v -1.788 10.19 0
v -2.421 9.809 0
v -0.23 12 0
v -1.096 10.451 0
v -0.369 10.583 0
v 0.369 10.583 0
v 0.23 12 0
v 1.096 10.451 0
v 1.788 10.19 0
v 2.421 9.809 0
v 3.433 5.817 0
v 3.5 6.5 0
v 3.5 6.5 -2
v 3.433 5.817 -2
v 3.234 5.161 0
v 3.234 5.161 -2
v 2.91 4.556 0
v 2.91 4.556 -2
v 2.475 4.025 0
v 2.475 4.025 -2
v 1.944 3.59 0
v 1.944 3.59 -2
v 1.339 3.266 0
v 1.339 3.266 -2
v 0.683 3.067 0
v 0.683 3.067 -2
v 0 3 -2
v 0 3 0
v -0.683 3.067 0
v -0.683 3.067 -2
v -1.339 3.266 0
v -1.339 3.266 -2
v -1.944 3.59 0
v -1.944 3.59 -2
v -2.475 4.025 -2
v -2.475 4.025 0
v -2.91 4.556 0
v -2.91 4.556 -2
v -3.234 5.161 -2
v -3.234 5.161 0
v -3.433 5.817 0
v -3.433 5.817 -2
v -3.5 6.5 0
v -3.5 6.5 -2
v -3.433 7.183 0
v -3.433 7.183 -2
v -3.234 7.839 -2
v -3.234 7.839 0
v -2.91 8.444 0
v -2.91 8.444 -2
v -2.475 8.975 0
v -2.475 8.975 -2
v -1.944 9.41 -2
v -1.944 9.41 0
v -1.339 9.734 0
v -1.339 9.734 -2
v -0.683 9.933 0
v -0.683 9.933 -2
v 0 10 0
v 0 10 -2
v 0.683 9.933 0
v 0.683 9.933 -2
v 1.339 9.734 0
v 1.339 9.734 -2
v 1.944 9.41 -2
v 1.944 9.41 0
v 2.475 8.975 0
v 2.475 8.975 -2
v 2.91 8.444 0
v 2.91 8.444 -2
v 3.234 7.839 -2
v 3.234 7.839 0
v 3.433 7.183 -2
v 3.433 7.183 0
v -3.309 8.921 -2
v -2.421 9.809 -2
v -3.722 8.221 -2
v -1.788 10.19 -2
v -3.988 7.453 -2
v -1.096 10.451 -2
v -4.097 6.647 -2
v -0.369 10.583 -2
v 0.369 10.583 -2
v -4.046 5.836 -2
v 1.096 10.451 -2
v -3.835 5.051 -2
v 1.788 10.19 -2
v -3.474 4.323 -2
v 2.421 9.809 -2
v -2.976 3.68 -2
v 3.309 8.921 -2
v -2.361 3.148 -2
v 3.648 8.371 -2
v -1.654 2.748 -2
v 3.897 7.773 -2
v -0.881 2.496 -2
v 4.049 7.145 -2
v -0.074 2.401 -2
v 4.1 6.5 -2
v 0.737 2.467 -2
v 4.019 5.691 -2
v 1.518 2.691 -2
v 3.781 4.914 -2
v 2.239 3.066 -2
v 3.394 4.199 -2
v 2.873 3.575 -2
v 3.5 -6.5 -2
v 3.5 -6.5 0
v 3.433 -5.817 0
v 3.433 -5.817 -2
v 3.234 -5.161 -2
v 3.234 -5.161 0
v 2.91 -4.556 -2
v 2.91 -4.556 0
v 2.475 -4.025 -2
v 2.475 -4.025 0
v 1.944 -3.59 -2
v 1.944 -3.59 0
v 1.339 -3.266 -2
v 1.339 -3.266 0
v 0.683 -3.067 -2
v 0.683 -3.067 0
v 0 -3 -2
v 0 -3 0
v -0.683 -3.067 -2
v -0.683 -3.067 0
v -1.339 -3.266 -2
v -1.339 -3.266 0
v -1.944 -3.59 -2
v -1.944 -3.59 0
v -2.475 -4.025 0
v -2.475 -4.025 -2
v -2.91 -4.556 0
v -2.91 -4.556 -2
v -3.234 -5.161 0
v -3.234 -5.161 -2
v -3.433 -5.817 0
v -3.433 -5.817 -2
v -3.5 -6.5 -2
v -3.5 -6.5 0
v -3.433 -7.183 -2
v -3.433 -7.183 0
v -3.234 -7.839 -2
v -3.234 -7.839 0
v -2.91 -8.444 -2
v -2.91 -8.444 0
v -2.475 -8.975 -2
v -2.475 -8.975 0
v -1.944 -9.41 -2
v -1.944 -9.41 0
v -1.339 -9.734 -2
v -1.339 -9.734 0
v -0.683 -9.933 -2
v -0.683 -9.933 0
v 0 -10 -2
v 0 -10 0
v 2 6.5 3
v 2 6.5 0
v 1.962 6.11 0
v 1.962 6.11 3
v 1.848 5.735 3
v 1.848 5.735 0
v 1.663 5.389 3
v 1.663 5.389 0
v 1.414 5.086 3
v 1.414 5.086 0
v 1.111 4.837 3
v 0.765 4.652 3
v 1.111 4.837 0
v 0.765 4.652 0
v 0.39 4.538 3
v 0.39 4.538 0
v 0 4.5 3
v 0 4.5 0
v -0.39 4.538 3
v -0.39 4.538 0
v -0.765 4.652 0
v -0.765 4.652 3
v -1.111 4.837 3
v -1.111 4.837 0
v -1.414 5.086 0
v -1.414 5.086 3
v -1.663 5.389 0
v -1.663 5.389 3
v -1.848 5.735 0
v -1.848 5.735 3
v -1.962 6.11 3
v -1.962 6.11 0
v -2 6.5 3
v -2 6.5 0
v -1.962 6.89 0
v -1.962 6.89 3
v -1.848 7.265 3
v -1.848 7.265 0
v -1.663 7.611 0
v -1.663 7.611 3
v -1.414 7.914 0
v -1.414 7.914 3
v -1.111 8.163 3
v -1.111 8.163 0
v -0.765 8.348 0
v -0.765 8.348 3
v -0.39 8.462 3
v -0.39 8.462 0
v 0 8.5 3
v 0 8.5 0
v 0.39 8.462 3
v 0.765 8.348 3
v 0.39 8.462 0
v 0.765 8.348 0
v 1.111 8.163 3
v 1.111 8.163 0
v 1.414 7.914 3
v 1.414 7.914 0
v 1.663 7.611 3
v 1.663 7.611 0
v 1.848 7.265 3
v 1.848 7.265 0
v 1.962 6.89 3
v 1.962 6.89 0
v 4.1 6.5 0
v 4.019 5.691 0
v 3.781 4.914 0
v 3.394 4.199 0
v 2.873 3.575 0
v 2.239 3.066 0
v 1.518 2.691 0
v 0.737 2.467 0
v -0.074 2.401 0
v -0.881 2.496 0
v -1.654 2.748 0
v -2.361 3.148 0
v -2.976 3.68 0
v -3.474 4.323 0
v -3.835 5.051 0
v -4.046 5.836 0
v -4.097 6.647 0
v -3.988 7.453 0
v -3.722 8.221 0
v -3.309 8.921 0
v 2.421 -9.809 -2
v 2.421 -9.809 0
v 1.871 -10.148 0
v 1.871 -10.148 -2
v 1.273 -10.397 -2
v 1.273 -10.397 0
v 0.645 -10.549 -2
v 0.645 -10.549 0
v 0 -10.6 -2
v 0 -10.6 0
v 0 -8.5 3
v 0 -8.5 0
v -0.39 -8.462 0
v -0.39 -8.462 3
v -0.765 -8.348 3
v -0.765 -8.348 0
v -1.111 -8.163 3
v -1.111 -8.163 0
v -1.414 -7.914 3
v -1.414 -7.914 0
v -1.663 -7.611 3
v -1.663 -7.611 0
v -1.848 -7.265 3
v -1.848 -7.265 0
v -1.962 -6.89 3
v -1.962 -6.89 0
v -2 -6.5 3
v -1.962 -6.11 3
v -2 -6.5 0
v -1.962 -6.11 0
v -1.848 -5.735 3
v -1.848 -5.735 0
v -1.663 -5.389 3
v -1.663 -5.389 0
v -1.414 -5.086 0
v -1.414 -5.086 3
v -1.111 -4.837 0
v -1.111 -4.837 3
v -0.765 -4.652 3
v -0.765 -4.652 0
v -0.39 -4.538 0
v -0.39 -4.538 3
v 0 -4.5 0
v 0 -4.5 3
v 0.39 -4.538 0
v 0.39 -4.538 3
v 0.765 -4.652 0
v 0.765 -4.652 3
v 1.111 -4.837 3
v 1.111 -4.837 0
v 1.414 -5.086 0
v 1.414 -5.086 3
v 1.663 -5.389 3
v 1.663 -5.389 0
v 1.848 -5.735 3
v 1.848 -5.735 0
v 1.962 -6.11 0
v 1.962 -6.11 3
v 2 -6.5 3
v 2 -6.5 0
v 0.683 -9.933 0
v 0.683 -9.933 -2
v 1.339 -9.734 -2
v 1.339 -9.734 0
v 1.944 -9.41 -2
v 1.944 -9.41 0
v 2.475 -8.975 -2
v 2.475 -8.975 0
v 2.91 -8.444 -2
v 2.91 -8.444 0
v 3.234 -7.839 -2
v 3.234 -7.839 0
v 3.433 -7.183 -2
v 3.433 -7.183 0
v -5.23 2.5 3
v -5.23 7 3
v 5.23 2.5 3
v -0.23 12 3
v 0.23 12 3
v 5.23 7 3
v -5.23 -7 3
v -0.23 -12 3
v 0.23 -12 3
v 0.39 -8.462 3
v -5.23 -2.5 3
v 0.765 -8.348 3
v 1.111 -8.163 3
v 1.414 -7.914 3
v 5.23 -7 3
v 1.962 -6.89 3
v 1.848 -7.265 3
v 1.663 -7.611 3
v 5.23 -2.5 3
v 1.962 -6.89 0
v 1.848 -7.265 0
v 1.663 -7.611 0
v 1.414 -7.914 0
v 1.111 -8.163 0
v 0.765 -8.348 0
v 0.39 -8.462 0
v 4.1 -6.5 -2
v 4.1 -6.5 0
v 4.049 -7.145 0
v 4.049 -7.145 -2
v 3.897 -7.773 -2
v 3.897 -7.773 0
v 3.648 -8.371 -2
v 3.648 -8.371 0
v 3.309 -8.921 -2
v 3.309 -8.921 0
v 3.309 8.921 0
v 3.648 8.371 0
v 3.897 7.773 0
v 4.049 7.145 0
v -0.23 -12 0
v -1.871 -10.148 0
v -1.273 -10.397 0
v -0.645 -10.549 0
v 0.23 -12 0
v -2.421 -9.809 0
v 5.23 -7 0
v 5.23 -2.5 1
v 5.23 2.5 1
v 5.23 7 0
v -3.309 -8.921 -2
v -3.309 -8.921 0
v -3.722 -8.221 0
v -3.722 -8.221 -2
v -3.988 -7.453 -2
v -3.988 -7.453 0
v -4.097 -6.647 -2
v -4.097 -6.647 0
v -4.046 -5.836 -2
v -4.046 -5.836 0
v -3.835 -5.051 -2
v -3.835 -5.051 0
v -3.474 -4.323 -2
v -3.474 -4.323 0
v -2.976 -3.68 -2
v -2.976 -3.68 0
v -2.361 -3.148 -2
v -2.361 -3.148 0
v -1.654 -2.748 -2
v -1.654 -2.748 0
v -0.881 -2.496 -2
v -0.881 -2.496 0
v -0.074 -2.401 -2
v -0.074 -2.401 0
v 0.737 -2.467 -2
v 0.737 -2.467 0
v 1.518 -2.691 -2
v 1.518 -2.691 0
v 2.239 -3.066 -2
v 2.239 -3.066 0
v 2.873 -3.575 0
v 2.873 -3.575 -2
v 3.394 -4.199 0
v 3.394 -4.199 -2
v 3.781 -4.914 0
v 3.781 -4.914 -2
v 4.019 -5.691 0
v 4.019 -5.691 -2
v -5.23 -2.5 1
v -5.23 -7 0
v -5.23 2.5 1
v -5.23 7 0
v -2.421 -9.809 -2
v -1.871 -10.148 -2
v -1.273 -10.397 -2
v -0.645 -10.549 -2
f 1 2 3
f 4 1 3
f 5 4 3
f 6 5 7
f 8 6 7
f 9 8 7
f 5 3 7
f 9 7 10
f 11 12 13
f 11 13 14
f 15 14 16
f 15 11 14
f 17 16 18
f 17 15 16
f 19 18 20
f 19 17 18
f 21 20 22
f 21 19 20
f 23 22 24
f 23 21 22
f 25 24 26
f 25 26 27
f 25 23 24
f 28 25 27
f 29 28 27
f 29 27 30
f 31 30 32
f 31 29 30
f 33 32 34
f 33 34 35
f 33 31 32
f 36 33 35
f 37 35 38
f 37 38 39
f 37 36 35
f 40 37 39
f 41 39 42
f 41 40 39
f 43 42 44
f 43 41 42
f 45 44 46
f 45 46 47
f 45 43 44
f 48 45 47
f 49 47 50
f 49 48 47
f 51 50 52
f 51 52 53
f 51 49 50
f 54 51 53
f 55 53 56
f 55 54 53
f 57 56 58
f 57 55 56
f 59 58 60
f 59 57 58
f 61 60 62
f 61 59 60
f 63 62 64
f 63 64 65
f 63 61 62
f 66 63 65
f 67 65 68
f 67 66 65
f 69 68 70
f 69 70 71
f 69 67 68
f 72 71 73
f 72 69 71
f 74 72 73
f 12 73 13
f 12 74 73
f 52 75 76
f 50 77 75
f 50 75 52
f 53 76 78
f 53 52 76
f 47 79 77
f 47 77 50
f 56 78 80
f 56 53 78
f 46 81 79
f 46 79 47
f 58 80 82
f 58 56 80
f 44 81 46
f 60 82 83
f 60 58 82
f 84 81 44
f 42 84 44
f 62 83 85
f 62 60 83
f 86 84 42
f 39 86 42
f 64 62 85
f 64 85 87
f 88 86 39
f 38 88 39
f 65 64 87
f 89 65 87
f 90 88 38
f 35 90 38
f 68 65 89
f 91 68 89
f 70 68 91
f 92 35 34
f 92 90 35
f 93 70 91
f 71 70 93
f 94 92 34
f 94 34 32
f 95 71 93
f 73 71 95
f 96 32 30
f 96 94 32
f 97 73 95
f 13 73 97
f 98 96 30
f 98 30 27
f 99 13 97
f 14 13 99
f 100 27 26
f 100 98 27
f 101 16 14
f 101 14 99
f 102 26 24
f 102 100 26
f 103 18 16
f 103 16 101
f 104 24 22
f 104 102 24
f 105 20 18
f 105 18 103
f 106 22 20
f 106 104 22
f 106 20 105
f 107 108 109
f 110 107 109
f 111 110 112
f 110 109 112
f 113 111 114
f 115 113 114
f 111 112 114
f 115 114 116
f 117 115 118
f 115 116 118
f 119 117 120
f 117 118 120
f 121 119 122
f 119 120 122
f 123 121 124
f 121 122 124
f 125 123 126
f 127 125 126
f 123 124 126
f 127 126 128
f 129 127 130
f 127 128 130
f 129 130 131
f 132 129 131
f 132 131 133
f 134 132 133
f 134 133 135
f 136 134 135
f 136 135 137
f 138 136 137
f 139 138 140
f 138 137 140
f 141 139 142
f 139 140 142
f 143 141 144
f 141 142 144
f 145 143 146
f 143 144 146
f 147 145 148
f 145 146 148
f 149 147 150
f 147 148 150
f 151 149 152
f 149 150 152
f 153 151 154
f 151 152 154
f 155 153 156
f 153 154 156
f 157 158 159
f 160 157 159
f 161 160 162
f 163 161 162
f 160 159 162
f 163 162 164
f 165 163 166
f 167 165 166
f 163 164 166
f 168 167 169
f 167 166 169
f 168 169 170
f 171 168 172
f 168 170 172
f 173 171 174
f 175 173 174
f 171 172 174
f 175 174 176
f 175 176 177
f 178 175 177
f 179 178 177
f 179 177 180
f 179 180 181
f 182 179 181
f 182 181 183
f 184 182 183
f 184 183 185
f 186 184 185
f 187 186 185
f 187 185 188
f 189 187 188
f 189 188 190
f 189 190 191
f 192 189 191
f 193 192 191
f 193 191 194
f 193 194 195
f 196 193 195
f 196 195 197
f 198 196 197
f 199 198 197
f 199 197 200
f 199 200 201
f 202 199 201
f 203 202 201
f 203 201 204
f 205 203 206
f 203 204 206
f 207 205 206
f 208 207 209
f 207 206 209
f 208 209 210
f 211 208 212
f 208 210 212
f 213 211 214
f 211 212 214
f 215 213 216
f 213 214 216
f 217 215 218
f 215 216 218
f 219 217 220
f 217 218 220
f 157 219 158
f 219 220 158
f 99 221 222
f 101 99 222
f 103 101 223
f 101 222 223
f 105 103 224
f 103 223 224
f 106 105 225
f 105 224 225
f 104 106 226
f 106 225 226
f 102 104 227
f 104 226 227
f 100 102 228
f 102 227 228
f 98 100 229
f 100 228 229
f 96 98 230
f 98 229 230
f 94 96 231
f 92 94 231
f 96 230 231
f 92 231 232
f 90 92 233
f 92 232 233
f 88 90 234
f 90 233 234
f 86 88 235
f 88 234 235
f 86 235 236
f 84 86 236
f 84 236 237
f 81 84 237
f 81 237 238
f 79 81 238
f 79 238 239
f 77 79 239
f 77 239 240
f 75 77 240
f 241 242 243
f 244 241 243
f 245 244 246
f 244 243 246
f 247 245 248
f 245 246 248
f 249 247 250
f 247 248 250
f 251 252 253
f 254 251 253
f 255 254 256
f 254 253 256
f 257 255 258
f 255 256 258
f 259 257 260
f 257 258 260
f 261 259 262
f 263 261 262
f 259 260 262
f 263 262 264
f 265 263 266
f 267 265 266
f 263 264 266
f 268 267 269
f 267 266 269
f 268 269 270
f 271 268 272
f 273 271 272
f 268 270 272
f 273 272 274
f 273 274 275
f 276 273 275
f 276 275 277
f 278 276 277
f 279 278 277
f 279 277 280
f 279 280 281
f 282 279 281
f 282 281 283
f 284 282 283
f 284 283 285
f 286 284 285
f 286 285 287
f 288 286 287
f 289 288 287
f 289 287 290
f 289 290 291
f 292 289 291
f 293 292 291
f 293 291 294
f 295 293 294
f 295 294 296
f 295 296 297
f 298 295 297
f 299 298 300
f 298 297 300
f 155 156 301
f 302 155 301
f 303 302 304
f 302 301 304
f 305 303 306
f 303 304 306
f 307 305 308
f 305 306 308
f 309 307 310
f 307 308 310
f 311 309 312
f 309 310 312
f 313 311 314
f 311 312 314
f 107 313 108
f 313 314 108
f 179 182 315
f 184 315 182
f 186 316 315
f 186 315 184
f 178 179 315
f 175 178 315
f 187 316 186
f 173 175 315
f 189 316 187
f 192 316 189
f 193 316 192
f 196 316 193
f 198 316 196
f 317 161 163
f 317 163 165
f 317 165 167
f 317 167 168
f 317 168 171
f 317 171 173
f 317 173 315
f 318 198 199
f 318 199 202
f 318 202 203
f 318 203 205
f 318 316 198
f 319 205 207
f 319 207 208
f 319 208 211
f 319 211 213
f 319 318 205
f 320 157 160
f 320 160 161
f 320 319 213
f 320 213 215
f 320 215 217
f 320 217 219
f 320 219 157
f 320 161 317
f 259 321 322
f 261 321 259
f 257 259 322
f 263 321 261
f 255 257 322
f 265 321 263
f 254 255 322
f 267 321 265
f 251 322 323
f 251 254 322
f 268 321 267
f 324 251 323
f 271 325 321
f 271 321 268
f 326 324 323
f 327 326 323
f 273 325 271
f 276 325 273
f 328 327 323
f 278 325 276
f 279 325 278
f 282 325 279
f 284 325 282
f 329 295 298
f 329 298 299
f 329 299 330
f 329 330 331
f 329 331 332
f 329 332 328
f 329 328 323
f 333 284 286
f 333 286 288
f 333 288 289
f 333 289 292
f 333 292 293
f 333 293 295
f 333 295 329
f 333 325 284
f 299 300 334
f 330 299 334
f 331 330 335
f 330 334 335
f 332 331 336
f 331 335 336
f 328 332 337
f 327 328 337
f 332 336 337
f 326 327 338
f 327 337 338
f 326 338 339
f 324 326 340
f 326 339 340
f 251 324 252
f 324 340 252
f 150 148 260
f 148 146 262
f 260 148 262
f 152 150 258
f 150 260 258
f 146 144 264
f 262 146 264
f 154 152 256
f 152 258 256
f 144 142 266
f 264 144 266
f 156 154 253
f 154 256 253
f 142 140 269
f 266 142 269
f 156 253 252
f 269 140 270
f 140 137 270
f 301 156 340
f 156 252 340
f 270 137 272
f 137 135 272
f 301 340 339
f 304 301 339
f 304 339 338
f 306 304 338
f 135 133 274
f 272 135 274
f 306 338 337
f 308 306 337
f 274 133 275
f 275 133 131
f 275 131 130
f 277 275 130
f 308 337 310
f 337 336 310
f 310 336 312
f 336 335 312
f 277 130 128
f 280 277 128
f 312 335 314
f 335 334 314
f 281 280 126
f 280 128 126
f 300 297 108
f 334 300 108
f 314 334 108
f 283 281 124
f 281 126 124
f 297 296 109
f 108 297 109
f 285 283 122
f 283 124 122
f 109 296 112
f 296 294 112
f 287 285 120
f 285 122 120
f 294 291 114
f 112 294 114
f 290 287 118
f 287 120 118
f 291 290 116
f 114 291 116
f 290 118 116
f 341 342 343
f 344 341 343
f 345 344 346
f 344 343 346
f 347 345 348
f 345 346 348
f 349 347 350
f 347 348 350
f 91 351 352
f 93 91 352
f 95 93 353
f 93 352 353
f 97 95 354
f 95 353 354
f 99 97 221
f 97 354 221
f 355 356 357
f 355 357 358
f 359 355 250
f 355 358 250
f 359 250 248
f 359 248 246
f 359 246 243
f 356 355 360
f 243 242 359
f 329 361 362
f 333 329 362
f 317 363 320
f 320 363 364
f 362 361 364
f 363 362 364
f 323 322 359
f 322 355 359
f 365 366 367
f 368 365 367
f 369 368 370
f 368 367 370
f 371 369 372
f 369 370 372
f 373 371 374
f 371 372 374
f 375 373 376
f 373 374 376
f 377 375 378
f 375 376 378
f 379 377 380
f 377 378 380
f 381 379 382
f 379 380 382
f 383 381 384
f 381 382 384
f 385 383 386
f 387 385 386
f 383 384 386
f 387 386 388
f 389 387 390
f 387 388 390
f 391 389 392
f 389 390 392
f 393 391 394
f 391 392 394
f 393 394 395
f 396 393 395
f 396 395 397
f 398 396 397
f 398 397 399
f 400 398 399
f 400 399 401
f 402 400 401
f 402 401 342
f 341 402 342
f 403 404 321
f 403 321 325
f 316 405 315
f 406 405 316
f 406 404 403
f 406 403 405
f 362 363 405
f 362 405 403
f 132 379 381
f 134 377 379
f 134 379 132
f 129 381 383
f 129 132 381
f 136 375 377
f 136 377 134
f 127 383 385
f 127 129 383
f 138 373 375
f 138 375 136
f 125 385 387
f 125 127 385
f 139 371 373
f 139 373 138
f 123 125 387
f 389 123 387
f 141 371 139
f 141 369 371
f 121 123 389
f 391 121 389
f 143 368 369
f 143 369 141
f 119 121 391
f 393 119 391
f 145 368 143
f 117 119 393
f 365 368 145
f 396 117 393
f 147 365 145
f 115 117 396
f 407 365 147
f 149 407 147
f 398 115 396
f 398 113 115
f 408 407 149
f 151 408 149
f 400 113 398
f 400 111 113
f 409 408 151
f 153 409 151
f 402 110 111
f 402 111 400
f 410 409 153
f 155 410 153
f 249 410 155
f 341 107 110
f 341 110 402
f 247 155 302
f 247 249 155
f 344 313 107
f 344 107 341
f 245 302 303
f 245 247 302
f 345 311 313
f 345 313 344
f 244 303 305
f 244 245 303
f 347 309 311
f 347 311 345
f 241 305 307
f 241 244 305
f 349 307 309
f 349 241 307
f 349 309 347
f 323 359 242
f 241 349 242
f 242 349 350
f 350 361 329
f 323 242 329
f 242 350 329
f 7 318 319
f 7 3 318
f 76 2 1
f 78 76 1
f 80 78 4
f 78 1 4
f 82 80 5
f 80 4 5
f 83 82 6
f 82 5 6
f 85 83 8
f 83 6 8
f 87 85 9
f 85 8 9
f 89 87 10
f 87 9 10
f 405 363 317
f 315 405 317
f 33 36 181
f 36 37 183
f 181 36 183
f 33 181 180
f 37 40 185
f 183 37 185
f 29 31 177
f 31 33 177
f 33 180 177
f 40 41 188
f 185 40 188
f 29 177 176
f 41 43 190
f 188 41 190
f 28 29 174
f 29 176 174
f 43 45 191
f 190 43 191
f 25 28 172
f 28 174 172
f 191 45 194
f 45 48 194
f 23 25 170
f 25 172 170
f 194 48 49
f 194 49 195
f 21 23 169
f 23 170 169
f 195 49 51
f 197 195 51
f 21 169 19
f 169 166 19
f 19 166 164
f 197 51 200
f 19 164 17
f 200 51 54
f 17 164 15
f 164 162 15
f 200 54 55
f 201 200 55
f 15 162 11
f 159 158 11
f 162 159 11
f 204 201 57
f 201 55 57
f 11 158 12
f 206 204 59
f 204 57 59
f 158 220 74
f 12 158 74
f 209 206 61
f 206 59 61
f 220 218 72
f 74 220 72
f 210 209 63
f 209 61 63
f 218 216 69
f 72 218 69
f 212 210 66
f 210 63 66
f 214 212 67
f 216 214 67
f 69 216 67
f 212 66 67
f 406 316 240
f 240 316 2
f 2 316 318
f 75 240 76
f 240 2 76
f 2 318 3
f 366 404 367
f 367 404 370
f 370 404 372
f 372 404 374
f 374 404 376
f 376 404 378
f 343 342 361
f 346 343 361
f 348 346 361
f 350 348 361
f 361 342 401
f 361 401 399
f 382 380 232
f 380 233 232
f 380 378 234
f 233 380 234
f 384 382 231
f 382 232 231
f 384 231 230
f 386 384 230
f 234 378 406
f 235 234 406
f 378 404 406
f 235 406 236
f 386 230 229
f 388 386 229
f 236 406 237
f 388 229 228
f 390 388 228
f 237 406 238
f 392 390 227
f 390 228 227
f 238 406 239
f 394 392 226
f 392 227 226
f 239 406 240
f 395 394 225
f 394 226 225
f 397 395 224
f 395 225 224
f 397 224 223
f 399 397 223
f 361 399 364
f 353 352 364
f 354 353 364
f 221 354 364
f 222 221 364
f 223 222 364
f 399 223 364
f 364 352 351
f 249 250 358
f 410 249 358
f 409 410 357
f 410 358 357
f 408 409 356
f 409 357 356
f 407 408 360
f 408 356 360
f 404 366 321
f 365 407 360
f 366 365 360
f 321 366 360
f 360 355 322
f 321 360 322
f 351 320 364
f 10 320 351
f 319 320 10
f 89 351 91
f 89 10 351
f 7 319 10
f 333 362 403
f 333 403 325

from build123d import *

# Parameters (mm, degrees)
F0_W     = 10.4597713798
F0_H     = 24
F0_W_2   = 10
F0_H_2   = 5
F1_DEPTH = 1
F2_DEPTH = 3
F3_DEPTH = 25
F4_DEPTH = 25
F5_SIZE  = 5
F6_R     = 2
F7_DEPTH = 25
F6_R_2   = 3.5
F8_DEPTH = 2


with BuildPart() as f1:
    # F0 (on Top) → F1 (new body)
    with BuildSketch(Plane.XY):
        Rectangle(F0_W, F0_H)
        Rectangle(F0_W_2, F0_H_2, mode=Mode.SUBTRACT)
        Rectangle(F0_W_2, F0_H_2)
    extrude(amount=F1_DEPTH)

    # F0 (on Top) → F2 (join)
    with BuildSketch(Plane.XY):
        Rectangle(F0_W, F0_H)
        Rectangle(F0_W_2, F0_H_2, mode=Mode.SUBTRACT)
    extrude(amount=F2_DEPTH)

    # F3 (cut): a face of the model
    f3_faces = [f1.faces().sort_by_distance(p)[0] for p in [
        (-5, 0, 2),
    ]]
    extrude(f3_faces, amount=-F3_DEPTH, mode=Mode.SUBTRACT)

    # F4 (cut): a face of the model
    f4_faces = [f1.faces().sort_by_distance(p)[0] for p in [
        (5, 0, 2),
    ]]
    extrude(f4_faces, amount=-F4_DEPTH, mode=Mode.SUBTRACT)

    # F5
    f5_edges = [f1.edges().sort_by_distance(p)[0] for p in [
        (-5.229886, -12, 1.5),
        (5.229886, -12, 1.5),
        (5.229886, 12, 1.5),
        (-5.229886, 12, 1.5),
    ]]
    chamfer(f5_edges, length=F5_SIZE)

    # F6 (on face) → F7 (cut)
    with BuildSketch(Plane(origin=(0, 0, 0), x_dir=(1, 0, 0), z_dir=(0, 0, -1))):
        with BuildLine():
            ThreePointArc((2, 6.5), (1.4142135624, 7.9142135624), (0, 8.5))
            ThreePointArc((0, 8.5), (-1.4142135624, 5.0857864376), (2, 6.5))
        make_face()
        with Locations((0, -6.5)):
            Circle(F6_R)
    extrude(amount=-F7_DEPTH, mode=Mode.SUBTRACT)

    # F6 (on face) → F8 (join)
    with BuildSketch(Plane(origin=(0, 0, 0), x_dir=(1, 0, 0), z_dir=(0, 0, -1))):
        with BuildLine():
            ThreePointArc((2.4209805773, 9.8089051126), (1.2734773336, 10.3972112441), (0, 10.6))
            ThreePointArc((0, 10.6), (-1.2734773336, 10.3972112441), (-2.4209805773, 9.8089051126))
            Line((-2.4209805773, 9.8089051126), (-3.3089051126, 8.9209805773))
            ThreePointArc((-3.3089051126, 8.9209805773), (-1.2734773336, 2.6027887559), (4.1, 6.5))
            ThreePointArc((4.1, 6.5), (3.8972112441, 7.7734773336), (3.3089051126, 8.9209805773))
            Line((3.3089051126, 8.9209805773), (2.4209805773, 9.8089051126))
        make_face()
        with BuildLine():
            ThreePointArc((3.5, 6.5), (-2.4748737342, 4.0251262658), (0, 10))
            ThreePointArc((0, 10), (2.4748737342, 8.9748737342), (3.5, 6.5))
        make_face(mode=Mode.SUBTRACT)
        with BuildLine():
            Line((2.4209805773, -9.8089051126), (3.3089051126, -8.9209805773))
            ThreePointArc((3.3089051126, -8.9209805773), (3.8972112441, -7.7734773336), (4.1, -6.5))
            ThreePointArc((4.1, -6.5), (-1.2734773336, -2.6027887559), (-3.3089051126, -8.9209805773))
            Line((-3.3089051126, -8.9209805773), (-2.4209805773, -9.8089051126))
            ThreePointArc((-2.4209805773, -9.8089051126), (0, -10.6), (2.4209805773, -9.8089051126))
        make_face()
        with Locations((0, -6.5)):
            Circle(F6_R_2, mode=Mode.SUBTRACT)
    extrude(amount=F8_DEPTH)


solid = f1.part
